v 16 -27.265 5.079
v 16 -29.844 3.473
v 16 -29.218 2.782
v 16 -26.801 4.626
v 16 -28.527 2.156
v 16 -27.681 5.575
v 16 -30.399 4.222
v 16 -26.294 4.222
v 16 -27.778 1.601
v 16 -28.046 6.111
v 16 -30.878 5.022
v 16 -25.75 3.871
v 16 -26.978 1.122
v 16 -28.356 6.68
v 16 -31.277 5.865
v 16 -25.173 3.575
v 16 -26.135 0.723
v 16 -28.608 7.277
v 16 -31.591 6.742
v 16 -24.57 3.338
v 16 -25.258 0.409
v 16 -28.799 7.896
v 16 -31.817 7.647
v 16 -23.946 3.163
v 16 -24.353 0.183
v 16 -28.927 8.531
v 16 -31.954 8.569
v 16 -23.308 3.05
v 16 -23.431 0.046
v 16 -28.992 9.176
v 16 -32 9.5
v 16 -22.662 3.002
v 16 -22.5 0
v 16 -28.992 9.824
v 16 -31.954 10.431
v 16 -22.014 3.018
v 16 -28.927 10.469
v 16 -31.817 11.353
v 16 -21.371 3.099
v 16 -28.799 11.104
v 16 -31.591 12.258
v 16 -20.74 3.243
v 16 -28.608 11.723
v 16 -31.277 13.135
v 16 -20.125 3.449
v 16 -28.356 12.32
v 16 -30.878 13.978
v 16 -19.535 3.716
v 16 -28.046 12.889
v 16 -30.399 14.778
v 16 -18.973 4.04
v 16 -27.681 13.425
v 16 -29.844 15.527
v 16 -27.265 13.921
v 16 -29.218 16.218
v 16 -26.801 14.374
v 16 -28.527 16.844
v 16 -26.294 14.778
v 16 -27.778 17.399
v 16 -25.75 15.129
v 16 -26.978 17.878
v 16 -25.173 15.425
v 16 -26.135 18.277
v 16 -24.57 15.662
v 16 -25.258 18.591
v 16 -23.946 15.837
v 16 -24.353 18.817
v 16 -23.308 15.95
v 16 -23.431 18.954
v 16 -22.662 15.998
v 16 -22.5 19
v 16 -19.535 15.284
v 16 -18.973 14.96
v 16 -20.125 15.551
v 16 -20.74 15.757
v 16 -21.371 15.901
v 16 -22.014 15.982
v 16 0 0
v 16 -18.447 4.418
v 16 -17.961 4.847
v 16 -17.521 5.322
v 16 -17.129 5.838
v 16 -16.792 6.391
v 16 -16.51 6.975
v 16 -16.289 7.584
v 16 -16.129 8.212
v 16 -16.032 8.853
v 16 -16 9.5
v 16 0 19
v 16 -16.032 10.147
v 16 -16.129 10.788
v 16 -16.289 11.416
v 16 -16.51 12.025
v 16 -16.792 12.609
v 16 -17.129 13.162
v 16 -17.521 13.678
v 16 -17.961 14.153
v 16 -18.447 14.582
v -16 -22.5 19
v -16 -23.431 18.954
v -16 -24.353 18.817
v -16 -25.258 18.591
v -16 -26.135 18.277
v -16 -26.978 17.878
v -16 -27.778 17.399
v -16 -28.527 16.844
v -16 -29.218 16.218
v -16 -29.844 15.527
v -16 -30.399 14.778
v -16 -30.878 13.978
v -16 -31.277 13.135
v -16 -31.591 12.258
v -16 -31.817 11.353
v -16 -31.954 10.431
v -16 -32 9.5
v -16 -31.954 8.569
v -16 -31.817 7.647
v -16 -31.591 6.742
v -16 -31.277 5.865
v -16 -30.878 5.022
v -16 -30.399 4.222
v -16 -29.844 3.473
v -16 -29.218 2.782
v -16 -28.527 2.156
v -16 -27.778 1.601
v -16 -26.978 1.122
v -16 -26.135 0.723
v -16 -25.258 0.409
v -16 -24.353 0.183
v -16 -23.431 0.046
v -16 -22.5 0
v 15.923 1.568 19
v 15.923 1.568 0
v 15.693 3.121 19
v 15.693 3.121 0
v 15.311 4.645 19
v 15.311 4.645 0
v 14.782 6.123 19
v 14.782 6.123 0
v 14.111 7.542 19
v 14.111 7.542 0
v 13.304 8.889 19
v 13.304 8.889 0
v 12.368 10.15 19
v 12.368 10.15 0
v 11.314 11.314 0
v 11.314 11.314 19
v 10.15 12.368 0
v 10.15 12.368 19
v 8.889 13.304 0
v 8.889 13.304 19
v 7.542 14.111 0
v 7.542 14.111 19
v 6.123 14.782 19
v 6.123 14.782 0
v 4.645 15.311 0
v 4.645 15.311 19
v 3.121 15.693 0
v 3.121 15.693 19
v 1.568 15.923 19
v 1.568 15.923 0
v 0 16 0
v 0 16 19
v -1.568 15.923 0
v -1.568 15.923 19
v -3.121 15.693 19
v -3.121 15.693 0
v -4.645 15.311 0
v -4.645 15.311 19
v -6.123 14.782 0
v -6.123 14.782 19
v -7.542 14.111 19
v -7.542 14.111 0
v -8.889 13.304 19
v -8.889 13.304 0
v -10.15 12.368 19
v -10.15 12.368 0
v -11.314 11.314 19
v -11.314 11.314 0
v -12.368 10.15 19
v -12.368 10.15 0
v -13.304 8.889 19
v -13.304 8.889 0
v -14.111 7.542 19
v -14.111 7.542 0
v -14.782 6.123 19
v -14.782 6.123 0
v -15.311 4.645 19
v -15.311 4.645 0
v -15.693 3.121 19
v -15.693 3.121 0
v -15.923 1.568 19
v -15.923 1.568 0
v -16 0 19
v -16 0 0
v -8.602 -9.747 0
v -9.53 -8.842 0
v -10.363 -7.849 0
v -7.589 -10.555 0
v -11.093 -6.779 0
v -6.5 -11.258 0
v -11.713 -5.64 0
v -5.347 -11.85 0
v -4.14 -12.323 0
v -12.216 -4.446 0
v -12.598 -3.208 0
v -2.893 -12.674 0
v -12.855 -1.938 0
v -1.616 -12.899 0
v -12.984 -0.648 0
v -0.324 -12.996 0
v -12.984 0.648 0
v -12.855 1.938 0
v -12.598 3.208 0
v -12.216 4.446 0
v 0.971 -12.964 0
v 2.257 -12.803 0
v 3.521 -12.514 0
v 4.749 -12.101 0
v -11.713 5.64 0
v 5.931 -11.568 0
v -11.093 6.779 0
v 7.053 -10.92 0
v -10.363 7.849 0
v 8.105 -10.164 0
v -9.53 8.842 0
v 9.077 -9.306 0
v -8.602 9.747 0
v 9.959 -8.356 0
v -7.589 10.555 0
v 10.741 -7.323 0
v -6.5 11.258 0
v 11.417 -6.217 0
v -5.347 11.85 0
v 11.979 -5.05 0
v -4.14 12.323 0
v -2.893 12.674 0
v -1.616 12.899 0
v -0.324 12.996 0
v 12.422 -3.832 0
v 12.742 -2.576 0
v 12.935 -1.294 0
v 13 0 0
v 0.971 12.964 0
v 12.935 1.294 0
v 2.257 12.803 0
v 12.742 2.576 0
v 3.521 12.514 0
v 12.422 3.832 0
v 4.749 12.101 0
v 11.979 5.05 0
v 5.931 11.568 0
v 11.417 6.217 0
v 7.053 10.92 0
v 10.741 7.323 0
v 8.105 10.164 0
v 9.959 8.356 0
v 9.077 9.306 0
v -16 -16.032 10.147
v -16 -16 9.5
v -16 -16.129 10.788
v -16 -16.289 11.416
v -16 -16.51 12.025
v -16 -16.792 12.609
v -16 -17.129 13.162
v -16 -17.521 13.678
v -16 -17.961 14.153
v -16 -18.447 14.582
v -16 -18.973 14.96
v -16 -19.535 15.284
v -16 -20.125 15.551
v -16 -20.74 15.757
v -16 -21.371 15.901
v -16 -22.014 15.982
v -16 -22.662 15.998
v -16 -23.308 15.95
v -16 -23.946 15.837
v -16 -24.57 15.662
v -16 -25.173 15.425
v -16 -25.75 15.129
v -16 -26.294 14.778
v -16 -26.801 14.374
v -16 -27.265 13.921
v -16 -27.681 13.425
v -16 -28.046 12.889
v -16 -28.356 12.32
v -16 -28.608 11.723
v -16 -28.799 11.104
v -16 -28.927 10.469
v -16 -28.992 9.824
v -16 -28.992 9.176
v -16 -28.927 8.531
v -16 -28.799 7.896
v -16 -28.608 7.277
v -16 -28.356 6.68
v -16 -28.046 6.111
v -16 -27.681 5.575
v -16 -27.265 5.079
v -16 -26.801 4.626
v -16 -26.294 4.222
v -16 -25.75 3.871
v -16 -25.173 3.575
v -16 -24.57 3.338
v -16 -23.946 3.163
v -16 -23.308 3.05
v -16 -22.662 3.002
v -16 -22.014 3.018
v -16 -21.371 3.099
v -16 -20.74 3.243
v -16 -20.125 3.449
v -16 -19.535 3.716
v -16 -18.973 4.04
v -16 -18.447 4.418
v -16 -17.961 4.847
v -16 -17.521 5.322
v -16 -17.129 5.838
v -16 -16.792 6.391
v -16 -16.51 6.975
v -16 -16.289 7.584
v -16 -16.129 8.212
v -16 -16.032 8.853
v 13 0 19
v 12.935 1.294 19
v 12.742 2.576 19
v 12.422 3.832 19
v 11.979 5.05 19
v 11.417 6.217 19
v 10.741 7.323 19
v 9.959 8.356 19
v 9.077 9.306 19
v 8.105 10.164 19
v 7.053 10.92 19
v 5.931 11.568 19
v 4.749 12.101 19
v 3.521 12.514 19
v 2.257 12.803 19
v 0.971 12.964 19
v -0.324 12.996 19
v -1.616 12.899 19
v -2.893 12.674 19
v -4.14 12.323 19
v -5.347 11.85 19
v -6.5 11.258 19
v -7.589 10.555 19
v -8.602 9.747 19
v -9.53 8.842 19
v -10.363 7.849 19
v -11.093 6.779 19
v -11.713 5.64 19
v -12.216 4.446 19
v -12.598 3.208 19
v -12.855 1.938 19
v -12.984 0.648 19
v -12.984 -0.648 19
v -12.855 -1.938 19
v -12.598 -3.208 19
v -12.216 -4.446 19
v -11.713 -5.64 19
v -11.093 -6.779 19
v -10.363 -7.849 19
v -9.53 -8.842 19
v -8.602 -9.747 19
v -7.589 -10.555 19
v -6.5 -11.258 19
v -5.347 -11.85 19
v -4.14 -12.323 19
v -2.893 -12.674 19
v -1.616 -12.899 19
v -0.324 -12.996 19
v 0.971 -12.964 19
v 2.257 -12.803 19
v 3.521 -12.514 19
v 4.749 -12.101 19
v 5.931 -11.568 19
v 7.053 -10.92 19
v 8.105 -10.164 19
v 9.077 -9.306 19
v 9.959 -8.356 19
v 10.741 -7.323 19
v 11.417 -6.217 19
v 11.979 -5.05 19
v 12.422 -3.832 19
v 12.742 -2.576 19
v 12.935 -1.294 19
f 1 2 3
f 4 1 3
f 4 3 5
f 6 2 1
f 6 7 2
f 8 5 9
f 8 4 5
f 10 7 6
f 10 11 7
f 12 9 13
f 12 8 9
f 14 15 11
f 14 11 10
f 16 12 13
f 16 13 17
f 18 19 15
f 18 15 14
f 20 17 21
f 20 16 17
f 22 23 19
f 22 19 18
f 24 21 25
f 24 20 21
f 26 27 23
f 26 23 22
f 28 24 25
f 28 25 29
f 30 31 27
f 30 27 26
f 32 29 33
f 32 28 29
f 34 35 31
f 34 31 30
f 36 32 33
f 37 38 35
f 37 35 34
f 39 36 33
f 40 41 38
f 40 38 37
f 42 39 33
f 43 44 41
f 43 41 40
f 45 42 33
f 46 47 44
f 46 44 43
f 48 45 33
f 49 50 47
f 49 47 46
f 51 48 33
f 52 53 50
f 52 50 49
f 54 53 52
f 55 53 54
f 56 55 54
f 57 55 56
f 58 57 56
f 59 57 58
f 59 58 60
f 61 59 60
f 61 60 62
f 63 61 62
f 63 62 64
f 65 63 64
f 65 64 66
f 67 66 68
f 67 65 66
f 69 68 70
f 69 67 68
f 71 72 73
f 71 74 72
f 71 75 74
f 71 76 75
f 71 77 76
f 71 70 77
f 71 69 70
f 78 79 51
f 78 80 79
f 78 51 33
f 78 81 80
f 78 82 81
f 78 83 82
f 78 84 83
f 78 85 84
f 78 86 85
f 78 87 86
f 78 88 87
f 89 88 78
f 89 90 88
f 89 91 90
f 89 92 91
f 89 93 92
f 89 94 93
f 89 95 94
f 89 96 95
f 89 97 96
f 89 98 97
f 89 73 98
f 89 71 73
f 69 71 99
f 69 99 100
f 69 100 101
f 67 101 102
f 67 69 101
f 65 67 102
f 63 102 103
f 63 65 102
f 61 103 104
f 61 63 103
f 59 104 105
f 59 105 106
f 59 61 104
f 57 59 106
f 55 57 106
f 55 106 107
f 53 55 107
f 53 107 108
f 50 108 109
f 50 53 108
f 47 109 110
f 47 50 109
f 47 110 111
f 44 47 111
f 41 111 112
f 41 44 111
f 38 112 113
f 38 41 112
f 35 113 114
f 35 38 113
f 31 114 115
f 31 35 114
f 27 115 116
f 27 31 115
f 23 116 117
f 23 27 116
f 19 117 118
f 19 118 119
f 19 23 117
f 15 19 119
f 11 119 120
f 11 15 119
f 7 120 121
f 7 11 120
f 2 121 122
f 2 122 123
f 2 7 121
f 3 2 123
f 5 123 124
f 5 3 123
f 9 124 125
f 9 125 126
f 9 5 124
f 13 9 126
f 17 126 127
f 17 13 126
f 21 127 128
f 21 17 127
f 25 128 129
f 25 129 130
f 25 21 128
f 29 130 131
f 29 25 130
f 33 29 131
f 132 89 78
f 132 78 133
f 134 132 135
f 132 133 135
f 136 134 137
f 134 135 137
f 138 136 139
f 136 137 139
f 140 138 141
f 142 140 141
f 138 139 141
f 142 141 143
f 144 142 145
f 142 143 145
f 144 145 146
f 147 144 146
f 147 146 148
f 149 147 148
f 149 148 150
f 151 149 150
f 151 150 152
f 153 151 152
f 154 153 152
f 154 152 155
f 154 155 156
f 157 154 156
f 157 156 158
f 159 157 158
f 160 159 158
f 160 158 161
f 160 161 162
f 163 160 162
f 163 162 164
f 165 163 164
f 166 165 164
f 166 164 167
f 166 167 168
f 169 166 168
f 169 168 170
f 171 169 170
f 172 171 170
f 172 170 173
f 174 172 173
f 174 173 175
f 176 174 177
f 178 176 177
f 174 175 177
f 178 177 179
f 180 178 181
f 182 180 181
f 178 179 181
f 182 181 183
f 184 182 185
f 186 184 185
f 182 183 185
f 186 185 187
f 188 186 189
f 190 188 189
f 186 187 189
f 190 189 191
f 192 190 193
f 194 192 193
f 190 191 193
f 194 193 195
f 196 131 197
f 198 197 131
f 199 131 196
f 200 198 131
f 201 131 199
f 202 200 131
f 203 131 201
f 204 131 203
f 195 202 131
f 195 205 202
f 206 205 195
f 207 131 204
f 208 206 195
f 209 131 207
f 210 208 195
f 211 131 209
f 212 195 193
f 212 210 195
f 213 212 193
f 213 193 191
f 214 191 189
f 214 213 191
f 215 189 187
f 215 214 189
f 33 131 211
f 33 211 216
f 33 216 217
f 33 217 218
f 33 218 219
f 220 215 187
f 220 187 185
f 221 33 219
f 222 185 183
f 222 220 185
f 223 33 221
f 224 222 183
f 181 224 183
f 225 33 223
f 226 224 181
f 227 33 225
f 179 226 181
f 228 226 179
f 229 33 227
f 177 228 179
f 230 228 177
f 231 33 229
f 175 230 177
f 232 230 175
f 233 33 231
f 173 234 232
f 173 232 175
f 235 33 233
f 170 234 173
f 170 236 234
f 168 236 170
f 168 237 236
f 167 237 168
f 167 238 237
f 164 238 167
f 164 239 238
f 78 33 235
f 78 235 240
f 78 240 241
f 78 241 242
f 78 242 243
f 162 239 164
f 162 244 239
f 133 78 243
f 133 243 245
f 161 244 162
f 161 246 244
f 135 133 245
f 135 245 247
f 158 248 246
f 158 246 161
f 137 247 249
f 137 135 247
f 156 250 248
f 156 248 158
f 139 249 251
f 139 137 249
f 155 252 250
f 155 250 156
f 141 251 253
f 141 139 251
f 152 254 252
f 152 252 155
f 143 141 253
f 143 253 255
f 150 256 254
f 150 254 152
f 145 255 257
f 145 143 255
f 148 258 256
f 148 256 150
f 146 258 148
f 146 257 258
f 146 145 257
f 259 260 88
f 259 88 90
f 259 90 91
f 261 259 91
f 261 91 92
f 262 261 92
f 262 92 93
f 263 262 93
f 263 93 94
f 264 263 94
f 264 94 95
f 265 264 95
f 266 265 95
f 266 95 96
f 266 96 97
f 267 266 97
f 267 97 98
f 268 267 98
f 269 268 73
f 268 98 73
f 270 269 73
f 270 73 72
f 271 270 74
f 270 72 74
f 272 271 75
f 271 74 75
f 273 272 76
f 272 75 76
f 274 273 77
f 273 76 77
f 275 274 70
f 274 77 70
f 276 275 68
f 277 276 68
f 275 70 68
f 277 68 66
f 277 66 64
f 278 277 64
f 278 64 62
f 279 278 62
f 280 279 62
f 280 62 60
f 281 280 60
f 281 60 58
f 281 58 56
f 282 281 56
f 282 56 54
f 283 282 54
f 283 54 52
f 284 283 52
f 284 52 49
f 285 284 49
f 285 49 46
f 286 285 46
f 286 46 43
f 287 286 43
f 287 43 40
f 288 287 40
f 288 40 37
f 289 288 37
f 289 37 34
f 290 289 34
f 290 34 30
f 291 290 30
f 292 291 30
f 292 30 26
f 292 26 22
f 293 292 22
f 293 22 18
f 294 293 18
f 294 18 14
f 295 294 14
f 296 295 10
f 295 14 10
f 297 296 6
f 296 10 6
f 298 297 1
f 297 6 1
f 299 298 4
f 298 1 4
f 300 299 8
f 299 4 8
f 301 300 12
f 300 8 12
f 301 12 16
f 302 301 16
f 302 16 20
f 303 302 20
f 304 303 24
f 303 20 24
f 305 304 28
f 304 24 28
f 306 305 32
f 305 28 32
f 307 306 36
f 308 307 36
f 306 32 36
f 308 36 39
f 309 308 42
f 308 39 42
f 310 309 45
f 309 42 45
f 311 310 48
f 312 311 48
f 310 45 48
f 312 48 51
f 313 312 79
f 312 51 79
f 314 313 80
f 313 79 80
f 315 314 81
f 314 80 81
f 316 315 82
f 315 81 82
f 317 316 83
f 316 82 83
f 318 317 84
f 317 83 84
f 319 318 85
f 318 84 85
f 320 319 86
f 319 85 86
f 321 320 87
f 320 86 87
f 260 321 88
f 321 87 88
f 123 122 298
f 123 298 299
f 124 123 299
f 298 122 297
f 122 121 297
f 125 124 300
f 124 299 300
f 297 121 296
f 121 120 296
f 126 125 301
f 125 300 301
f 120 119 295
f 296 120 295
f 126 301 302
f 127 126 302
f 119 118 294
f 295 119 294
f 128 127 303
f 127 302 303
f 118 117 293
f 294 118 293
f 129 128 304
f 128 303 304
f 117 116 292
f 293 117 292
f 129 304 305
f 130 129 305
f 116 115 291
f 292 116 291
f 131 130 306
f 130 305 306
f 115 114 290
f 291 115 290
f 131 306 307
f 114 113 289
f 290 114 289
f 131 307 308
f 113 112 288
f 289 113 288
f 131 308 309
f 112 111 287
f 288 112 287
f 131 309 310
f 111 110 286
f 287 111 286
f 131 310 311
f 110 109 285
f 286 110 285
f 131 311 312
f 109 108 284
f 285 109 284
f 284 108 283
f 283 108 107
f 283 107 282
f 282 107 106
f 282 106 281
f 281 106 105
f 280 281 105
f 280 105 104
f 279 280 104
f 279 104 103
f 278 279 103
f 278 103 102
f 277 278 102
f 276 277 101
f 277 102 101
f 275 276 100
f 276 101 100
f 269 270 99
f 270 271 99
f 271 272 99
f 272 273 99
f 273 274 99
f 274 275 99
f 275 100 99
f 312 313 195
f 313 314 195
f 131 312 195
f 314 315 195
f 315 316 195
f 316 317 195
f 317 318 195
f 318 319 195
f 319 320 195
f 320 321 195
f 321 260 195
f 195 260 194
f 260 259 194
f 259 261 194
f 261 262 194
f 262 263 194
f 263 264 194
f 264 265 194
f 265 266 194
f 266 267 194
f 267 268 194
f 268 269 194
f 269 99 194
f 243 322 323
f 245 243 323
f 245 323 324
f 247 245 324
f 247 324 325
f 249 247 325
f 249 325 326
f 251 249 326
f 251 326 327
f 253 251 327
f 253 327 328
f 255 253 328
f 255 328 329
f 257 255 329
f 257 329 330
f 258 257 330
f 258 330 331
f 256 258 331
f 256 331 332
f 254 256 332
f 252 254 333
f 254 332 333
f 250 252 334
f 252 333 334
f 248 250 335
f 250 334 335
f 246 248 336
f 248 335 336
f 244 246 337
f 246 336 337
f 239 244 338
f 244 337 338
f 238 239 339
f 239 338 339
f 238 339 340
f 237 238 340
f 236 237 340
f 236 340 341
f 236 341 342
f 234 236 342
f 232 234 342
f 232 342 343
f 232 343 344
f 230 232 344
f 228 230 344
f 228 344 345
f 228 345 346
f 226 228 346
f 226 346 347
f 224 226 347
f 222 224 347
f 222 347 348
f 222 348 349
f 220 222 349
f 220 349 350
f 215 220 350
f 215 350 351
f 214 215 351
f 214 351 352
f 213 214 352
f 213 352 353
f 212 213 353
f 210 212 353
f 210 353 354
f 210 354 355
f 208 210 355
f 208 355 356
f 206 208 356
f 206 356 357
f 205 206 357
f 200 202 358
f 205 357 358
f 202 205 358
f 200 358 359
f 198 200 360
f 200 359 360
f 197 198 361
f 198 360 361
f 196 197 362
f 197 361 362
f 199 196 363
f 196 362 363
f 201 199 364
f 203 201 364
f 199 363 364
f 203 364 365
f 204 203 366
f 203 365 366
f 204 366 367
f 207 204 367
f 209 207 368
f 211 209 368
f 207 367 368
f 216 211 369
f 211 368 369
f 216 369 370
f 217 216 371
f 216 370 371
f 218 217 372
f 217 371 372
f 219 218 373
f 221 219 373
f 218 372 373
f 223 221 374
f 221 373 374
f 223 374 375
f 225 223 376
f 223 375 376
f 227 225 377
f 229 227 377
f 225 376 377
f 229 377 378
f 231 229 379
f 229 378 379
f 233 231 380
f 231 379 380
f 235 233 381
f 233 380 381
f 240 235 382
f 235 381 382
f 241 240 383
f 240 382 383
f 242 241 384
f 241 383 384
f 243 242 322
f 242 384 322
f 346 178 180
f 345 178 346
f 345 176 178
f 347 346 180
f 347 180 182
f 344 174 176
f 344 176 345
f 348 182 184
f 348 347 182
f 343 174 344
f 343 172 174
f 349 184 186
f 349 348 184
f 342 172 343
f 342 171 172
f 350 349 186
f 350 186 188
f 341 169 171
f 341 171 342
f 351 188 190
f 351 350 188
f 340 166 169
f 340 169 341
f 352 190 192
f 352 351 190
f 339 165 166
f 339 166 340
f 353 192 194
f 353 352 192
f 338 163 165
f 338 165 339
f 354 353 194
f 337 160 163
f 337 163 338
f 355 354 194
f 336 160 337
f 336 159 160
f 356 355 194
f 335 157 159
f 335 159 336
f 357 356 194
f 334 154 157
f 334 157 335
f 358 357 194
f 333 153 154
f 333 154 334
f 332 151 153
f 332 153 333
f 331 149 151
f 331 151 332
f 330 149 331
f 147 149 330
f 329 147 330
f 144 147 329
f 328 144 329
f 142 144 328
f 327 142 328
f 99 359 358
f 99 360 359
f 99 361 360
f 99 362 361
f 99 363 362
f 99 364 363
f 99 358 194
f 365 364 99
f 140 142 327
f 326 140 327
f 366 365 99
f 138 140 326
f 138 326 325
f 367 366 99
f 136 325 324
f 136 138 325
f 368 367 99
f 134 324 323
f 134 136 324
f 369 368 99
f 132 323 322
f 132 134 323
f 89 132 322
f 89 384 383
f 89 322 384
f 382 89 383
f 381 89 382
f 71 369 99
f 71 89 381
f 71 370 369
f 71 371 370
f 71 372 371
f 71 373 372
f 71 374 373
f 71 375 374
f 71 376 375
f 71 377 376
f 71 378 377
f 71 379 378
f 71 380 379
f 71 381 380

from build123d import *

# Parameters (mm, degrees)
F0_R     = 16
F1_DEPTH = 19
F3_DEPTH = 16
F4_R     = 13
F5_DEPTH = 25
F6_R     = 6.5
F7_DEPTH = 32.001


with BuildPart() as f1:
    # F0 (on Top) → F1 (new body)
    with BuildSketch(Plane.XY):
        Circle(F0_R)
    extrude(amount=F1_DEPTH)

    # F2 (on Right) → F3 (join, symmetric)
    with BuildSketch(Plane.YZ):
        with BuildLine():
            Line((0, 19), (-22.5, 19))
            ThreePointArc((-22.5, 19), (-32, 9.5), (-22.5, 0))
            Line((-22.5, 0), (0, 0))
            Line((0, 0), (0, 19))
        make_face()
    extrude(amount=F3_DEPTH, both=True)

    # F4 (on face) → F5 (cut)
    with BuildSketch(Plane.XY.offset(19)):
        Circle(F4_R)
    extrude(amount=-F5_DEPTH, mode=Mode.SUBTRACT)

    # F6 (on face) → F7 (cut, through all)
    with BuildSketch(Plane.YZ.offset(16)):
        with Locations((-22.5, 9.5)):
            Circle(F6_R)
    extrude(amount=-F7_DEPTH, mode=Mode.SUBTRACT)


solid = f1.part
